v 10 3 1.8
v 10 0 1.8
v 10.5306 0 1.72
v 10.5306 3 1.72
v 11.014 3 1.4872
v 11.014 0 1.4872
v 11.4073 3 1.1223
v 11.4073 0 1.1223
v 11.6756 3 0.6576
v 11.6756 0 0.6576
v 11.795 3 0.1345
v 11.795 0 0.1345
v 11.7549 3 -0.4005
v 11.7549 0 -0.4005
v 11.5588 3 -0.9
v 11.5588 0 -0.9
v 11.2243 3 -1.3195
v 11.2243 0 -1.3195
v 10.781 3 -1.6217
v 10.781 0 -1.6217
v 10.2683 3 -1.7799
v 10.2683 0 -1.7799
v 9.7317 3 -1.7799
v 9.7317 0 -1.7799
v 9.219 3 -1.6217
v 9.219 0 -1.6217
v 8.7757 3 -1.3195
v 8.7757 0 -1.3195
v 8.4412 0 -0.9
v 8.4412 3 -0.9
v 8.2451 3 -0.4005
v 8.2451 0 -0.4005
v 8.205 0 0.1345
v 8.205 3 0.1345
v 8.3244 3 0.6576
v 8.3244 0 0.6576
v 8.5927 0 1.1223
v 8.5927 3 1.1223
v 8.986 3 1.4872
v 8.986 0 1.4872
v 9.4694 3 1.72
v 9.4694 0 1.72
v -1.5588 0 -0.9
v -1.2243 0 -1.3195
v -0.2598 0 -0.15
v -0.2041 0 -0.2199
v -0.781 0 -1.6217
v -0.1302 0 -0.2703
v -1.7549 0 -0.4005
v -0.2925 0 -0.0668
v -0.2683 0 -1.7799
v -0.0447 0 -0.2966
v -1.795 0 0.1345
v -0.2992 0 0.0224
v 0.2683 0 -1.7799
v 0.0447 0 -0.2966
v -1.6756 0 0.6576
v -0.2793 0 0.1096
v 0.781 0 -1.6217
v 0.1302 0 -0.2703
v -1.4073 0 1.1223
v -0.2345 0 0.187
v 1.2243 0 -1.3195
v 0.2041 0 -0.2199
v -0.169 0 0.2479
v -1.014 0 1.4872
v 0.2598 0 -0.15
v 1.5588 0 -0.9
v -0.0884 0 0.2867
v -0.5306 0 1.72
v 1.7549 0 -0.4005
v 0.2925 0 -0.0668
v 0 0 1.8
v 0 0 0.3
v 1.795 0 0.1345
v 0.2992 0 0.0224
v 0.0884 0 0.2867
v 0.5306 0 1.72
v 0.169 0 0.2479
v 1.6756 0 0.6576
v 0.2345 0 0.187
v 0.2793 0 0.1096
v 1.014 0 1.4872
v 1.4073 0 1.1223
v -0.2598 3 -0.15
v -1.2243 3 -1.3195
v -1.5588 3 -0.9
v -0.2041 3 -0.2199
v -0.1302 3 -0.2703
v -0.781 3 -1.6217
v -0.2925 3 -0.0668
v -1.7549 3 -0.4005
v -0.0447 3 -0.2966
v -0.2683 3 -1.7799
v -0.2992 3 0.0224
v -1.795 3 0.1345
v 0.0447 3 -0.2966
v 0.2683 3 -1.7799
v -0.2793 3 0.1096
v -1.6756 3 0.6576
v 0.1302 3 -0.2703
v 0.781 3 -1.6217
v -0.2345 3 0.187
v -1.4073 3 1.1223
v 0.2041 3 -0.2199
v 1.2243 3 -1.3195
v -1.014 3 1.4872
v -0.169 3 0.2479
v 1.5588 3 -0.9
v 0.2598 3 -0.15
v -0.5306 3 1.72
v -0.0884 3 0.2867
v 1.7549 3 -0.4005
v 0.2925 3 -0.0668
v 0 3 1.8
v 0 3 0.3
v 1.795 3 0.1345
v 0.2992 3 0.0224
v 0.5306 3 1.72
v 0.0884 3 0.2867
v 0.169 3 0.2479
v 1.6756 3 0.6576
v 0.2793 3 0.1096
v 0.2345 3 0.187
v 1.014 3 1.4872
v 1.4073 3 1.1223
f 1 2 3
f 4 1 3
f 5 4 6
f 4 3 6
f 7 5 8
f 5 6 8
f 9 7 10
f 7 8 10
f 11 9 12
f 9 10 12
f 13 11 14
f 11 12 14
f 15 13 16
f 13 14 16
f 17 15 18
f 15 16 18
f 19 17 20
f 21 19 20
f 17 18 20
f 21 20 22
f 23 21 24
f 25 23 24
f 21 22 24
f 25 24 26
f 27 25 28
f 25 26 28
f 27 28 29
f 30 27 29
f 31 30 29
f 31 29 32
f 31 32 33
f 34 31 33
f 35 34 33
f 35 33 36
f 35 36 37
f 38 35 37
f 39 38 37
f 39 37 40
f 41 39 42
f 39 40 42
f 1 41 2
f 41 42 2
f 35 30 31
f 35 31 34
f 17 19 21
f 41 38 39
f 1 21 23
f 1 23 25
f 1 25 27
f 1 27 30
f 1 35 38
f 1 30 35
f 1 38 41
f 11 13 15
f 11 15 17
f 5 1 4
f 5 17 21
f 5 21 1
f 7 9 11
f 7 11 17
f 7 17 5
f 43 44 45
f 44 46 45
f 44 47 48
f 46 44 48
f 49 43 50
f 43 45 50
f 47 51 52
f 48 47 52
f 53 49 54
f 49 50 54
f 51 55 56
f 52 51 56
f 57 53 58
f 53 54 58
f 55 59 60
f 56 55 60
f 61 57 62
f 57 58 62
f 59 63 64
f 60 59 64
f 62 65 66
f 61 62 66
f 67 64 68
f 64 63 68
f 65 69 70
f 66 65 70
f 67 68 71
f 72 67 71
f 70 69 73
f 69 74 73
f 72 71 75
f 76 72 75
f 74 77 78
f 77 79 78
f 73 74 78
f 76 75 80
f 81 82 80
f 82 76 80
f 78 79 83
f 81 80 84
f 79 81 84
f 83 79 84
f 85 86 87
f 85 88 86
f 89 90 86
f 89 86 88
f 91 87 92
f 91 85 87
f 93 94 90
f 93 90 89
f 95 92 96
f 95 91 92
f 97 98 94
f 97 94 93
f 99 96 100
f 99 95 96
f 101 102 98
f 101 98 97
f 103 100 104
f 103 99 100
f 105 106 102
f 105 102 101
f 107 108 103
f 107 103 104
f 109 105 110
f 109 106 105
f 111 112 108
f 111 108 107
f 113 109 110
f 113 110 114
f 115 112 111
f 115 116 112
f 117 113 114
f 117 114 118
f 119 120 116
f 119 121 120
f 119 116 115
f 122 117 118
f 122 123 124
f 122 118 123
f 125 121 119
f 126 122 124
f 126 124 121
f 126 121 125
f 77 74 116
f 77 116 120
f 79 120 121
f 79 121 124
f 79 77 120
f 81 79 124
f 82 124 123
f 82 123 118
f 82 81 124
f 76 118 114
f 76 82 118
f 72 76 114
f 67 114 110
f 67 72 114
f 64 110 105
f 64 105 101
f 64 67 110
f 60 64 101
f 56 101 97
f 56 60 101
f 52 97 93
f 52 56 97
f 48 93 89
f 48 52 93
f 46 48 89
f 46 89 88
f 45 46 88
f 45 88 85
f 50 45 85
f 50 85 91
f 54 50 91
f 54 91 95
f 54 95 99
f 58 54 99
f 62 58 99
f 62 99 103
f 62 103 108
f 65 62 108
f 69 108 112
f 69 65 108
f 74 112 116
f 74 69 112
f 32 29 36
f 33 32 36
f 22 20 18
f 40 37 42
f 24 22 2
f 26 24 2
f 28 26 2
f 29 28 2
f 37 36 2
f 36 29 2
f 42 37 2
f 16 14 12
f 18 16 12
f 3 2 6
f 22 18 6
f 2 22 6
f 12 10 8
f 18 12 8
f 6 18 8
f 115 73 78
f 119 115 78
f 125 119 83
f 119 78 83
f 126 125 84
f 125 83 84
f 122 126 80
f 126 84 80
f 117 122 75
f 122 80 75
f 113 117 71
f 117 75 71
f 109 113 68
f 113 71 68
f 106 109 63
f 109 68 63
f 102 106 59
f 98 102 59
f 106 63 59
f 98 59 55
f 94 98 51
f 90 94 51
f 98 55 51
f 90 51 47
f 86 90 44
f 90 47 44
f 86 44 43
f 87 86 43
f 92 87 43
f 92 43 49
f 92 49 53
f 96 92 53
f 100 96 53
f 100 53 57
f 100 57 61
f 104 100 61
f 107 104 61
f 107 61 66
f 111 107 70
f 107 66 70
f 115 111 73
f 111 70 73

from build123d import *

# Parameters (mm, degrees)
SKETCH1_R             = 1.8
SKETCH1_R_2           = 0.3
BOSS_EXTRUDE1_DEPTH   = 3
BOSS_EXTRUDE1_2_DEPTH = 3


with BuildPart() as part:
    # Sketch1 → Boss-Extrude1 (new body)
    with BuildSketch(Plane(origin=(0, 0, 0), x_dir=(1, 0, 0), z_dir=(0, 1, 0))):
        with Locations(Location((0, 0, 0), (0, 0, 270))):
            Circle(SKETCH1_R)
        with Locations(Location((0, 0, 0), (0, 0, 270))):
            Circle(SKETCH1_R_2, mode=Mode.SUBTRACT)
    extrude(amount=BOSS_EXTRUDE1_DEPTH)


with BuildPart() as body_2:
    # Sketch1 → Boss-Extrude1 2 (new body)
    with BuildSketch(Plane(origin=(0, 0, 0), x_dir=(1, 0, 0), z_dir=(0, 1, 0))):
        with Locations(Location((10, 0, 0), (0, 0, 270))):
            Circle(SKETCH1_R)
    extrude(amount=BOSS_EXTRUDE1_2_DEPTH)


solid = Compound([part.part, body_2.part])
